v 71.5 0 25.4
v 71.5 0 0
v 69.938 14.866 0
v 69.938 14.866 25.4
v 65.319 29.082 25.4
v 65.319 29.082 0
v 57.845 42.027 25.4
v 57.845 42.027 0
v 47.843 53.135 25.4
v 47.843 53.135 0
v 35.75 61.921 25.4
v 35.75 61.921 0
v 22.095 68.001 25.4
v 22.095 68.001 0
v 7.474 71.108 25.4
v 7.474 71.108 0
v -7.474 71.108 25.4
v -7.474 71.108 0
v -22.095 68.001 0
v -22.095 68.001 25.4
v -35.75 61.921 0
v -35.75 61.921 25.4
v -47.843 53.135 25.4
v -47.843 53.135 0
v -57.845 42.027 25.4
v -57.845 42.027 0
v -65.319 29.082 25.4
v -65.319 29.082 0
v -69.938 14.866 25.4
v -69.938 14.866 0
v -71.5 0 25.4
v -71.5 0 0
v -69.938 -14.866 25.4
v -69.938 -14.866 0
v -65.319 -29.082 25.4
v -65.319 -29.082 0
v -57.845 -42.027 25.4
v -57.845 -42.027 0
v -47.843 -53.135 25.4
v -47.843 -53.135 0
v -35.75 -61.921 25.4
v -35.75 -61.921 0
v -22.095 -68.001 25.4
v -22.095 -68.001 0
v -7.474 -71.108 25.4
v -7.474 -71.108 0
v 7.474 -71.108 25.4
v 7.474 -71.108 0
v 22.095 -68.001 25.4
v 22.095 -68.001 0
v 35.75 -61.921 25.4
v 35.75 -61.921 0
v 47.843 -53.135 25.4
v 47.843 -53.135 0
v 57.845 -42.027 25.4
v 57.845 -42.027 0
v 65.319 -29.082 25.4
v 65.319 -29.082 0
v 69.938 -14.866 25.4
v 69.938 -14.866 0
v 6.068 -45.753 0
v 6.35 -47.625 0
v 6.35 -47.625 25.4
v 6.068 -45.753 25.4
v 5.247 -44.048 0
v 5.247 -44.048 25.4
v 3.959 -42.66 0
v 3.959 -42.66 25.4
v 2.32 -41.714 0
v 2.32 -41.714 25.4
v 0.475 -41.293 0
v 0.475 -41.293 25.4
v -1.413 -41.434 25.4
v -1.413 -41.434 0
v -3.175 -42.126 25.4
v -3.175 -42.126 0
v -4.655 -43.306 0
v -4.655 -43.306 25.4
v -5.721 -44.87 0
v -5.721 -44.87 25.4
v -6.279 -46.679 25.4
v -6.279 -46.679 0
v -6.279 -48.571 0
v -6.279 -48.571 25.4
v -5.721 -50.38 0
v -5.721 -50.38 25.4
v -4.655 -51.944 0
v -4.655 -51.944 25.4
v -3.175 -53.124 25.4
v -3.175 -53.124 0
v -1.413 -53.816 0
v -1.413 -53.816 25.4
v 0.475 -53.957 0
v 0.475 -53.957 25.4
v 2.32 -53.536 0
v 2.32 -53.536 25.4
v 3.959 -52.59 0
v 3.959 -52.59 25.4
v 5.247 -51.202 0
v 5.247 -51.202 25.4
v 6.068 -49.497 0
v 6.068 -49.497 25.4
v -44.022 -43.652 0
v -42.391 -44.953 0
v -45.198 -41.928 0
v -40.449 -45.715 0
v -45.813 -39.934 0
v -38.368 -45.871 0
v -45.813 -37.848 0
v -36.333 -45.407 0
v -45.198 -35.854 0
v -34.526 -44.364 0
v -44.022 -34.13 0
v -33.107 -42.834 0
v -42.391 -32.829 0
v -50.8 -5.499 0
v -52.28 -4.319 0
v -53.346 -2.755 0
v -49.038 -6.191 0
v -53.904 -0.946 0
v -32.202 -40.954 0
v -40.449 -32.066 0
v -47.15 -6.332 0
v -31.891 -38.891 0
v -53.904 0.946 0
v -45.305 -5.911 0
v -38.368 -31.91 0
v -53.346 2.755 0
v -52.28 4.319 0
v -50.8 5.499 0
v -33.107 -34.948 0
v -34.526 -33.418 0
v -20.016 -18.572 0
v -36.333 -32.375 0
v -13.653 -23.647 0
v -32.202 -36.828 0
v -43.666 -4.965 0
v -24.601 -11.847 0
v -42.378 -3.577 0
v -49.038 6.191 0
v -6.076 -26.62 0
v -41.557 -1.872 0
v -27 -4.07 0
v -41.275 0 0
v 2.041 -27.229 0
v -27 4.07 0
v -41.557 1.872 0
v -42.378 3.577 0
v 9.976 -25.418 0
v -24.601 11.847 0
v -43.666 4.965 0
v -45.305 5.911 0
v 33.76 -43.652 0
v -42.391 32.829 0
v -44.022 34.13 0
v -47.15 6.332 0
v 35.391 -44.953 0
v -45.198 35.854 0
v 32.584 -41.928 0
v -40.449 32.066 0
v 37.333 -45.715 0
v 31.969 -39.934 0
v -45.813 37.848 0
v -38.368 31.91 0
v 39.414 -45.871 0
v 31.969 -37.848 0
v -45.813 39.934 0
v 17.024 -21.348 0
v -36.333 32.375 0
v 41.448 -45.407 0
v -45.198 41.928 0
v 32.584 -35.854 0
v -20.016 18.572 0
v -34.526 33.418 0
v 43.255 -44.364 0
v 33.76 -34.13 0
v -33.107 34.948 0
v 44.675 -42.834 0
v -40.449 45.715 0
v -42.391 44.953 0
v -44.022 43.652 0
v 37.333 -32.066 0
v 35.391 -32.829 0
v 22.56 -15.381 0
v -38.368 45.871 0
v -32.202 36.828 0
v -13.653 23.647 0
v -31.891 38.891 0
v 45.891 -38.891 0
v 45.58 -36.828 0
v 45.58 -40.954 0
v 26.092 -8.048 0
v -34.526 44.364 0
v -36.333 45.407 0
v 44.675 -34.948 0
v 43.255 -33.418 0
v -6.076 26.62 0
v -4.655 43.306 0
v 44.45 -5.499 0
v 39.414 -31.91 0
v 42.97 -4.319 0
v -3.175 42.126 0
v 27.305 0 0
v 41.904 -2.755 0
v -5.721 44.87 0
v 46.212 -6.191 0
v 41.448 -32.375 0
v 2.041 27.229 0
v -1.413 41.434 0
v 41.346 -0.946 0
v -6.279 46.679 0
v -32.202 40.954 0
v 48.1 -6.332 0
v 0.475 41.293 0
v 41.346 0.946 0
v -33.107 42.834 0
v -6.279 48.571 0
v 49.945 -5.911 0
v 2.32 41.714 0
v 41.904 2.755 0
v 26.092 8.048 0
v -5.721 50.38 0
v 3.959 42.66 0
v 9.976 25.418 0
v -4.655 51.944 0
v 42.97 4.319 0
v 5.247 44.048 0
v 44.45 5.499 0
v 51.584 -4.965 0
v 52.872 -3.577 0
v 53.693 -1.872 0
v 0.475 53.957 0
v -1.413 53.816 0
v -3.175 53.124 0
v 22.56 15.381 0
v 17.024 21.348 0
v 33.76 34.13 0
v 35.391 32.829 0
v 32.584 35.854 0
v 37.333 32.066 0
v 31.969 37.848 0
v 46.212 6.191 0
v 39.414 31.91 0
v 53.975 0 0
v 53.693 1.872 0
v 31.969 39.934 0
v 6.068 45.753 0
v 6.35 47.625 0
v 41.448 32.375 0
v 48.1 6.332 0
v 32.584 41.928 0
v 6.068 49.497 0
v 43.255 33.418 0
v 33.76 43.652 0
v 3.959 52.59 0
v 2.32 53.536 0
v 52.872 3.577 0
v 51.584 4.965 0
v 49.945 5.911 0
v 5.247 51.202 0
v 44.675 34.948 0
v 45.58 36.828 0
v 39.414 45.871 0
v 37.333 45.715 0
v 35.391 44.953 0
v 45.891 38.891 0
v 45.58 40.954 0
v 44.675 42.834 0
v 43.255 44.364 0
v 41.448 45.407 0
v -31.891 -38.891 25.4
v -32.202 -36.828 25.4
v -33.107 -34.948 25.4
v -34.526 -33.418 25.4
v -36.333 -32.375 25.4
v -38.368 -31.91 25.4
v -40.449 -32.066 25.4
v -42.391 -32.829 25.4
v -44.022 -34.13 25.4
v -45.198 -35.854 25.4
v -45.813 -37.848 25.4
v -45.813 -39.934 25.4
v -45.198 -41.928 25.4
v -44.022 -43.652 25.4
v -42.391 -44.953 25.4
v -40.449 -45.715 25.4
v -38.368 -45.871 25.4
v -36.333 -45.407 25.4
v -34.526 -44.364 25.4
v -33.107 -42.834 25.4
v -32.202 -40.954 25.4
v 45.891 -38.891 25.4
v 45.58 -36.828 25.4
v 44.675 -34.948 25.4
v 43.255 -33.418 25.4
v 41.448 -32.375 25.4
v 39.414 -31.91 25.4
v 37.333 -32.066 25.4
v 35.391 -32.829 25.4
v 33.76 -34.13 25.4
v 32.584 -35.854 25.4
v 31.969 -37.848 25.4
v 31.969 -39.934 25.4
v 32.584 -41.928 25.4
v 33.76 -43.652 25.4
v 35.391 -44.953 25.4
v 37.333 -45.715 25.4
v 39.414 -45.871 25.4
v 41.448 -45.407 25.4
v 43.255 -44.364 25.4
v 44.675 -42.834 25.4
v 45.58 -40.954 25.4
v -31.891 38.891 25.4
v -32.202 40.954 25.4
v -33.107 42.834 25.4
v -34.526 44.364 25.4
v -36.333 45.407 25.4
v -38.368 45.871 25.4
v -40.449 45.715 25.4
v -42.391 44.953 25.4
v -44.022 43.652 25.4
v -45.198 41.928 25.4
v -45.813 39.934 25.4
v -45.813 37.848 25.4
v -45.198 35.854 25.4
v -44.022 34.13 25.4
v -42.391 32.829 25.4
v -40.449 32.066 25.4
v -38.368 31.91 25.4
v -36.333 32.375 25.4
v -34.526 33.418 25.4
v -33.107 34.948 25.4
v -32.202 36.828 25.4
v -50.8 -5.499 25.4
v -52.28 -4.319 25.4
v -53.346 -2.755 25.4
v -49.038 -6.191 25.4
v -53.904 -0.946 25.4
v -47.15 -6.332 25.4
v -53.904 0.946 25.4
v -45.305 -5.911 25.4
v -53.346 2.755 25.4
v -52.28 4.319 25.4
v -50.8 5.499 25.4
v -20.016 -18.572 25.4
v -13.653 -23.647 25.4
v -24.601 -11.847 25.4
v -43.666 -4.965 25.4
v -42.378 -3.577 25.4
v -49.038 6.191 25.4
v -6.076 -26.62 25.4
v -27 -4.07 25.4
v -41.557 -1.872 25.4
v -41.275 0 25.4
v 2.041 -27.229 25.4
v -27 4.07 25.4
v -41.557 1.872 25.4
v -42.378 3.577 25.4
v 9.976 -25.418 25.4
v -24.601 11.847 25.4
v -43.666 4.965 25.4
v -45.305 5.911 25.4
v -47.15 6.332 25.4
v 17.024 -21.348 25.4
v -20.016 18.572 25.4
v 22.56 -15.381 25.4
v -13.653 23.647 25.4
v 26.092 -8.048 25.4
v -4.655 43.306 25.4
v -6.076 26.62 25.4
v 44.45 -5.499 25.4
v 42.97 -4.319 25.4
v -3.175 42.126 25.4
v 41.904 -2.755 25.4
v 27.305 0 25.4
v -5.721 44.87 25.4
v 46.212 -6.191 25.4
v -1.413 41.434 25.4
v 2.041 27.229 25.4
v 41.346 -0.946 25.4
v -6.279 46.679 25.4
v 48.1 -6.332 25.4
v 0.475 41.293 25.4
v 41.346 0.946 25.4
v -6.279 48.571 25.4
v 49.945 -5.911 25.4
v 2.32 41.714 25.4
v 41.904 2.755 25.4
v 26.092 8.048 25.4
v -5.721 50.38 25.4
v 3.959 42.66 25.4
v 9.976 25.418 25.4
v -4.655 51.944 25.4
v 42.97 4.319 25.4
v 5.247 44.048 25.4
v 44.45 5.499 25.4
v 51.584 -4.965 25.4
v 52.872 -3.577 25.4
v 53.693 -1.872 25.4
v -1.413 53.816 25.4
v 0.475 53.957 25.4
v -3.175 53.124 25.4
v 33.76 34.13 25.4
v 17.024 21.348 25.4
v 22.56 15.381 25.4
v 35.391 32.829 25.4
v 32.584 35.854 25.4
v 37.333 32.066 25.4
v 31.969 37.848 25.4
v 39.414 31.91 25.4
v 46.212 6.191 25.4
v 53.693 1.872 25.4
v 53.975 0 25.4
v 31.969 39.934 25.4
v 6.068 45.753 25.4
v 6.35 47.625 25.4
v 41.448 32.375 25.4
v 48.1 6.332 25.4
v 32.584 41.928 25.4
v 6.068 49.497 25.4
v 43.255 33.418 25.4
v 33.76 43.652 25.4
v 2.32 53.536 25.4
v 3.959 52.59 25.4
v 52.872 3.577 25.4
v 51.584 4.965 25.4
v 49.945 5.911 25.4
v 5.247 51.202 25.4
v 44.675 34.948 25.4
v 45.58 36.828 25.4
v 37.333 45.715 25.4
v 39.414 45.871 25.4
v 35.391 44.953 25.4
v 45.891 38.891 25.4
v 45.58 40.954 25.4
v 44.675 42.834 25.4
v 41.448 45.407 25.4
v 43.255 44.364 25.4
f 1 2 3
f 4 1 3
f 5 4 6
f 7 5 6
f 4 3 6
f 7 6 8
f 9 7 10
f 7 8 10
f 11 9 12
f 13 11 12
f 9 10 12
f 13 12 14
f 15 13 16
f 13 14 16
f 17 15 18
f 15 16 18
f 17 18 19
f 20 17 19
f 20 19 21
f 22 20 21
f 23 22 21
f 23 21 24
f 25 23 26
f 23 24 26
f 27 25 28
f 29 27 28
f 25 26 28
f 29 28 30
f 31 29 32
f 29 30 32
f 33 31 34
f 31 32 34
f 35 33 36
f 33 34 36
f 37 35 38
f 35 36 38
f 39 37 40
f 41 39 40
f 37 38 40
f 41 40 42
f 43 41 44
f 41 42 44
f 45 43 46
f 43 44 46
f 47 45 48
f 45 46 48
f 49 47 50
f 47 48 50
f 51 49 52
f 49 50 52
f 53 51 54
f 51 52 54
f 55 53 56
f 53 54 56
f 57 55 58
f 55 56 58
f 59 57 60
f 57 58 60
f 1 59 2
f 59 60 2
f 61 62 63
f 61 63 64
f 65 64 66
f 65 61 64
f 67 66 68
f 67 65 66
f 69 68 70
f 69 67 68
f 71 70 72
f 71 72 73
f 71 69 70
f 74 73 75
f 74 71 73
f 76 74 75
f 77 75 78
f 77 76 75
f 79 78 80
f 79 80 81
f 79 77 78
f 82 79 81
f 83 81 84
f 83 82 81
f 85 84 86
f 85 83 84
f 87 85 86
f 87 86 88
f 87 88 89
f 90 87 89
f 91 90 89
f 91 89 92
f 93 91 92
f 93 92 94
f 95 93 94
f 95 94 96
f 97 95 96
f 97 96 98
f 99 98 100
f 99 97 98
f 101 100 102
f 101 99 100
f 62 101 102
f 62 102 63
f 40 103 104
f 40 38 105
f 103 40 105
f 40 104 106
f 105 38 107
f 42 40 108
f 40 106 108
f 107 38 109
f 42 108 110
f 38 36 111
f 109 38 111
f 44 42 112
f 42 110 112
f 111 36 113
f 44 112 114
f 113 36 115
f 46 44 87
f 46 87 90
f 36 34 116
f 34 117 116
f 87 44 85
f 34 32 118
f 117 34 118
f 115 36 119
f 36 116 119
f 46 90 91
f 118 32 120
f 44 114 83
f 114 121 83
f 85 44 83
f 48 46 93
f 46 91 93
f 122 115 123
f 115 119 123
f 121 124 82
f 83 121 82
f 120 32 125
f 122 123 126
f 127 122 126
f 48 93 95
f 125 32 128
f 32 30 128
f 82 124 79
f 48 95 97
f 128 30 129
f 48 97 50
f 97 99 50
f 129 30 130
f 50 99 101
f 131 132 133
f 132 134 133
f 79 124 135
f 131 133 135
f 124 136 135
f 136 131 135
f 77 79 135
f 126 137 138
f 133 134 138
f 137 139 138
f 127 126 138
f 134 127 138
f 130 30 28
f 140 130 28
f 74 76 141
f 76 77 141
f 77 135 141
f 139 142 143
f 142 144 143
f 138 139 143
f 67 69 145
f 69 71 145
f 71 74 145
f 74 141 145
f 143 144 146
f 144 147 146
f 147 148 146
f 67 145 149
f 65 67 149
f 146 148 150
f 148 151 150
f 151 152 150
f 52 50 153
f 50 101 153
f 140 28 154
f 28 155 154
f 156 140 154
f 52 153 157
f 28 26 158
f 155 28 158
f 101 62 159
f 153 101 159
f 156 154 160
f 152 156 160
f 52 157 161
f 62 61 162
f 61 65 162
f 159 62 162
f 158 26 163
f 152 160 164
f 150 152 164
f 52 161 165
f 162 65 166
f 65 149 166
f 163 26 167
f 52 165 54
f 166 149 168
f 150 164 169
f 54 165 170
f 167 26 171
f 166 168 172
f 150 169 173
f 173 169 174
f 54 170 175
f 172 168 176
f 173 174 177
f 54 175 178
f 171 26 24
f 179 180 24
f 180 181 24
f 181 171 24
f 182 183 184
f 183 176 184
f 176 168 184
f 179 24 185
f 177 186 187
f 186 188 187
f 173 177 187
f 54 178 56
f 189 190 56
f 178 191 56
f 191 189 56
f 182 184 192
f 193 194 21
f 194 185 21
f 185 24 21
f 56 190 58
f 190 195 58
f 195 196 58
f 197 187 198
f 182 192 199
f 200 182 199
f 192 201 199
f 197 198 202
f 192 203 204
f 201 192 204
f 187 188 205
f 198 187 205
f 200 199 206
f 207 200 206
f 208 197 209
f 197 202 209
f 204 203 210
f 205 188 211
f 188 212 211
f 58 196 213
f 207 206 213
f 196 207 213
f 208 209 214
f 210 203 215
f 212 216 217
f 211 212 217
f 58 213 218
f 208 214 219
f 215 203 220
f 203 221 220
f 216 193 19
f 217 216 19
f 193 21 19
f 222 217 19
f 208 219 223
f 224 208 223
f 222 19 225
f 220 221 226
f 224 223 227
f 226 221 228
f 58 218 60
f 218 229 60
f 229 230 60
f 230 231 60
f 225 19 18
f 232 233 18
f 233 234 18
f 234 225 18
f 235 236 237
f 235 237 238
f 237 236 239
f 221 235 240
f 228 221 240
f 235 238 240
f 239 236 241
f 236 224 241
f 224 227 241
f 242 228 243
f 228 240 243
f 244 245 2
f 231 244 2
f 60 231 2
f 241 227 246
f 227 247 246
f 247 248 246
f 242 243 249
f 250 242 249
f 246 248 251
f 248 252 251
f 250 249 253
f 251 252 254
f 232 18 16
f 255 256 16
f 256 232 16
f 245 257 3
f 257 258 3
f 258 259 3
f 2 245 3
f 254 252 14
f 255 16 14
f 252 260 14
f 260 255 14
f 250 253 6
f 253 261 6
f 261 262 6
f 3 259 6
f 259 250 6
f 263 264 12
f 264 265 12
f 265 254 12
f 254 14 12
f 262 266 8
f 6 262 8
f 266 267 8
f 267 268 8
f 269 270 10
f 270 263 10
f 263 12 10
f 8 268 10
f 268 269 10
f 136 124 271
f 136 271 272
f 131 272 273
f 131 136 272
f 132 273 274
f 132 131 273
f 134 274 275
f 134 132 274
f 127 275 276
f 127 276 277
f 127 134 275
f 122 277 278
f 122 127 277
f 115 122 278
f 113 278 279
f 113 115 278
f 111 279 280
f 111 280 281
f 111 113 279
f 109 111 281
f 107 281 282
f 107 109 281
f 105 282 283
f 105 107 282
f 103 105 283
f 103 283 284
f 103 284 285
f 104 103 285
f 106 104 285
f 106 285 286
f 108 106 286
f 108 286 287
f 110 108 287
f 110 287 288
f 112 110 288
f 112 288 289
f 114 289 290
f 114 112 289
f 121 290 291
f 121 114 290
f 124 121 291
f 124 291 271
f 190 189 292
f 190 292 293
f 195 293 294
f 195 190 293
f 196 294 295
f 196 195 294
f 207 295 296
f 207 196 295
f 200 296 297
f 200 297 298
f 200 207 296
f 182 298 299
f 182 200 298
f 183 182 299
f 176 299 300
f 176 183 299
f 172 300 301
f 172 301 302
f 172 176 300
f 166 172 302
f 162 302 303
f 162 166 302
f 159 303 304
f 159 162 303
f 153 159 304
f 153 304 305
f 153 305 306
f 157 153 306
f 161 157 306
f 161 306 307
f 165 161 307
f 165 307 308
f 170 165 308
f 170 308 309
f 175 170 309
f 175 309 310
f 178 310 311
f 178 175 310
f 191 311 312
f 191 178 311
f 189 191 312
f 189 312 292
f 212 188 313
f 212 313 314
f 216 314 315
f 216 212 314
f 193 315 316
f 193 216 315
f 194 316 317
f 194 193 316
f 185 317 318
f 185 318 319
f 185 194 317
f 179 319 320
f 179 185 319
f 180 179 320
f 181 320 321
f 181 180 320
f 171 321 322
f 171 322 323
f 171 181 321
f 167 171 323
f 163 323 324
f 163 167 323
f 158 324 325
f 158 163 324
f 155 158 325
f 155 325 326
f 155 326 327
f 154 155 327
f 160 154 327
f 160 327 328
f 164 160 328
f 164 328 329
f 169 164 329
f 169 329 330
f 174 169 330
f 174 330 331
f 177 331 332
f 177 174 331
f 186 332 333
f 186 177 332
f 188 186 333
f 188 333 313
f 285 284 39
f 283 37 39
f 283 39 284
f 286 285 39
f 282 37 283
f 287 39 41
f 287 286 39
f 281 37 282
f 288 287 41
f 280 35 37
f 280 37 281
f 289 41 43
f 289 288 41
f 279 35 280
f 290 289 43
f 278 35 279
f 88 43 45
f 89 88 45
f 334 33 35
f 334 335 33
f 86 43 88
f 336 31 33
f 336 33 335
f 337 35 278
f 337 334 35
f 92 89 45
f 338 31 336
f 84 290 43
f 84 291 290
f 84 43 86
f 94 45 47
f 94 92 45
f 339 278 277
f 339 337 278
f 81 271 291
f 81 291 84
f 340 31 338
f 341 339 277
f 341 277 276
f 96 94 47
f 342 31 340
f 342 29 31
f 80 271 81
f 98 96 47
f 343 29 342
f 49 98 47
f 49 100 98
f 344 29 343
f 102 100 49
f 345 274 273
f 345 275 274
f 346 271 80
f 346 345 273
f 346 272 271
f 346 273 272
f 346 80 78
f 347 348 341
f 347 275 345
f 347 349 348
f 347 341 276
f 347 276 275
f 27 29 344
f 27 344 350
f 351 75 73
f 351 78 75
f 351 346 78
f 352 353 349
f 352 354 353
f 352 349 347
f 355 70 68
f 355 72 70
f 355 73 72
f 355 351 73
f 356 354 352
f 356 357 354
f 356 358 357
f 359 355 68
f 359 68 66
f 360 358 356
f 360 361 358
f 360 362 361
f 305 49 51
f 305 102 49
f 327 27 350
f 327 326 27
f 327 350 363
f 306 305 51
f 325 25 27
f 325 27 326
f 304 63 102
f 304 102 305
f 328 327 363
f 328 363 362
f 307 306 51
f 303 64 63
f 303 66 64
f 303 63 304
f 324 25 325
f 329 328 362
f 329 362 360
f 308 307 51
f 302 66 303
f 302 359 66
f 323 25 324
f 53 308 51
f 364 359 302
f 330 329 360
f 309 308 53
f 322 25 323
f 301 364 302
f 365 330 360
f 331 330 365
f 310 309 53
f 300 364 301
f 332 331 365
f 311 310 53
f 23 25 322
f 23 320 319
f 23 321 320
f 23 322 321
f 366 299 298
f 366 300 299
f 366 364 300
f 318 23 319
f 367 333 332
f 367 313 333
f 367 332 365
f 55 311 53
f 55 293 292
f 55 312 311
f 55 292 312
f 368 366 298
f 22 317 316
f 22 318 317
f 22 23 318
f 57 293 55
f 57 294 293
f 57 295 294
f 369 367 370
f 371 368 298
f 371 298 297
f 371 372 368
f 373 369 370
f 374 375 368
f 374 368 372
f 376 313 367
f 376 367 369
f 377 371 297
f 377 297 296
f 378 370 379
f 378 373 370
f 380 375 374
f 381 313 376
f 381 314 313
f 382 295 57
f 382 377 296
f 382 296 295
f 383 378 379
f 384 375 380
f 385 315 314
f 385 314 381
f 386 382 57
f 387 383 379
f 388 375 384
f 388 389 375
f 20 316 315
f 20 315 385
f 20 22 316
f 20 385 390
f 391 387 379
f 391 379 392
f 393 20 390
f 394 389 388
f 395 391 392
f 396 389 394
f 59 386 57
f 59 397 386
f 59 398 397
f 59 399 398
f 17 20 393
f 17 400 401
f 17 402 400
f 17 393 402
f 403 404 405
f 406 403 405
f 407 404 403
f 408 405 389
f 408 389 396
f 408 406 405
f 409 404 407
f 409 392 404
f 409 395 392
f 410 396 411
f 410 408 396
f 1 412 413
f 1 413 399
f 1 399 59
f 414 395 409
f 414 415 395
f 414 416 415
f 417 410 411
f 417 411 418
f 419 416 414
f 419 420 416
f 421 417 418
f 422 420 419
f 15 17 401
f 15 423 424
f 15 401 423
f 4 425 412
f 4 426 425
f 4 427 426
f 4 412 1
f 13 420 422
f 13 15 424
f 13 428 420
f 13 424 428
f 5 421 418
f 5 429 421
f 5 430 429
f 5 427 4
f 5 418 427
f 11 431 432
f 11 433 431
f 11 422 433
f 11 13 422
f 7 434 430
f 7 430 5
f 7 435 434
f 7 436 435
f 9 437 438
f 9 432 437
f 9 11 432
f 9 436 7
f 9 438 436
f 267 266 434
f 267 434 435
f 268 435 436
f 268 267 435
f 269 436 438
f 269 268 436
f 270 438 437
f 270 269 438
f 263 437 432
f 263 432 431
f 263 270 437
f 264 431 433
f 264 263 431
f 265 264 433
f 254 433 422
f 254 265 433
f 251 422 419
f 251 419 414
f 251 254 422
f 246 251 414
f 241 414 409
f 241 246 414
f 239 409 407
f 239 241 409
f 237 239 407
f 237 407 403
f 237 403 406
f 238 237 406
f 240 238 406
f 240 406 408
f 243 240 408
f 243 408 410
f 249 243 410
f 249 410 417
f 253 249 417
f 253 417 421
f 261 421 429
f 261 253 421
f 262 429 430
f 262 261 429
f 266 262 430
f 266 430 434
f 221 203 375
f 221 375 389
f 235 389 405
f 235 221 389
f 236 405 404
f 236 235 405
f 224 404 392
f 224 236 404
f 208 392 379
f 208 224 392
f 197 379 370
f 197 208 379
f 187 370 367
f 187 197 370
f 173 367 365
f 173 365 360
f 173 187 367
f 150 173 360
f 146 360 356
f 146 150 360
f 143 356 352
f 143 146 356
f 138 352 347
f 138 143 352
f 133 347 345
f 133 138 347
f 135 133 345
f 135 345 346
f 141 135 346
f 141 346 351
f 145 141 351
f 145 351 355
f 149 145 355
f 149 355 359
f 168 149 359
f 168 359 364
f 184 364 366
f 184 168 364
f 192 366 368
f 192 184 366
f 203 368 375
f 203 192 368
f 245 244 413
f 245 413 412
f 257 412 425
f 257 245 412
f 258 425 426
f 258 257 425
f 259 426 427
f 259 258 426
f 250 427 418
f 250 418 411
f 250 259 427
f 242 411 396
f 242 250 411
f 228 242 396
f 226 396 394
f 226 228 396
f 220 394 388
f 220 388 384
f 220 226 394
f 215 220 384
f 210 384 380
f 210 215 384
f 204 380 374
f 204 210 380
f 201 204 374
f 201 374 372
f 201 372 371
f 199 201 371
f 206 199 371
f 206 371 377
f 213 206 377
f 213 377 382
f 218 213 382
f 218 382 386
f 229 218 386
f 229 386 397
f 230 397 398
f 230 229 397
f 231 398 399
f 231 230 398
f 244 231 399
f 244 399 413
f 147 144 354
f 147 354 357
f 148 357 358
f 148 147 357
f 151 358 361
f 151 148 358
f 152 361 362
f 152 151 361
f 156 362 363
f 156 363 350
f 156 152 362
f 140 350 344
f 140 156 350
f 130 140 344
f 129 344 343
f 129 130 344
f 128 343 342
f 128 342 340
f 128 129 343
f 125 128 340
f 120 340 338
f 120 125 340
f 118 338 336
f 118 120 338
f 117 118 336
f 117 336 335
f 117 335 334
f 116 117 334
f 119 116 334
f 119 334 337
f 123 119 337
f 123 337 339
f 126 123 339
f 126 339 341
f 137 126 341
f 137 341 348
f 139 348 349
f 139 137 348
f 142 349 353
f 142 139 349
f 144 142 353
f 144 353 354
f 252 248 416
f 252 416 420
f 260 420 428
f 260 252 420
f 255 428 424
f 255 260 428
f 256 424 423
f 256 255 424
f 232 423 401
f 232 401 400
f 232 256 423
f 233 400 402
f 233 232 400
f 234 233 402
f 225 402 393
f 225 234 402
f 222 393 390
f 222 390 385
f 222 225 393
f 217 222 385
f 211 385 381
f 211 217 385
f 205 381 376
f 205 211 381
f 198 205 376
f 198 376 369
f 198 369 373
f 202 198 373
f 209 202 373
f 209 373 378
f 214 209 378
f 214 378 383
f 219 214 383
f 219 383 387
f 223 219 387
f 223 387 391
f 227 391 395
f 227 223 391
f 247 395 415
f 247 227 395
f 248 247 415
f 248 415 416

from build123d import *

# Parameters (mm, degrees)
F0_R     = 71.5
F0_R_2   = 7
F0_R_3   = 6.35
F0_R_4   = 27.305
F1_DEPTH = 25.4


with BuildPart() as f1:
    # F0 (on Top) → F1 (new body)
    with BuildSketch(Plane.XY):
        Circle(F0_R)
        with Locations((-38.890873, -38.890873)):
            Circle(F0_R_2, mode=Mode.SUBTRACT)
        with Locations((0, -47.625)):
            Circle(F0_R_3, mode=Mode.SUBTRACT)
        with Locations((38.890873, -38.890873)):
            Circle(F0_R_2, mode=Mode.SUBTRACT)
        with Locations((-47.625, 0)):
            Circle(F0_R_3, mode=Mode.SUBTRACT)
        with Locations((-38.890873, 38.890873)):
            Circle(F0_R_2, mode=Mode.SUBTRACT)
        Circle(F0_R_4, mode=Mode.SUBTRACT)
        with Locations((47.625, 0)):
            Circle(F0_R_3, mode=Mode.SUBTRACT)
        with Locations((0, 47.625)):
            Circle(F0_R_3, mode=Mode.SUBTRACT)
        with Locations((38.890873, 38.890873)):
            Circle(F0_R_2, mode=Mode.SUBTRACT)
    extrude(amount=F1_DEPTH)


solid = f1.part
